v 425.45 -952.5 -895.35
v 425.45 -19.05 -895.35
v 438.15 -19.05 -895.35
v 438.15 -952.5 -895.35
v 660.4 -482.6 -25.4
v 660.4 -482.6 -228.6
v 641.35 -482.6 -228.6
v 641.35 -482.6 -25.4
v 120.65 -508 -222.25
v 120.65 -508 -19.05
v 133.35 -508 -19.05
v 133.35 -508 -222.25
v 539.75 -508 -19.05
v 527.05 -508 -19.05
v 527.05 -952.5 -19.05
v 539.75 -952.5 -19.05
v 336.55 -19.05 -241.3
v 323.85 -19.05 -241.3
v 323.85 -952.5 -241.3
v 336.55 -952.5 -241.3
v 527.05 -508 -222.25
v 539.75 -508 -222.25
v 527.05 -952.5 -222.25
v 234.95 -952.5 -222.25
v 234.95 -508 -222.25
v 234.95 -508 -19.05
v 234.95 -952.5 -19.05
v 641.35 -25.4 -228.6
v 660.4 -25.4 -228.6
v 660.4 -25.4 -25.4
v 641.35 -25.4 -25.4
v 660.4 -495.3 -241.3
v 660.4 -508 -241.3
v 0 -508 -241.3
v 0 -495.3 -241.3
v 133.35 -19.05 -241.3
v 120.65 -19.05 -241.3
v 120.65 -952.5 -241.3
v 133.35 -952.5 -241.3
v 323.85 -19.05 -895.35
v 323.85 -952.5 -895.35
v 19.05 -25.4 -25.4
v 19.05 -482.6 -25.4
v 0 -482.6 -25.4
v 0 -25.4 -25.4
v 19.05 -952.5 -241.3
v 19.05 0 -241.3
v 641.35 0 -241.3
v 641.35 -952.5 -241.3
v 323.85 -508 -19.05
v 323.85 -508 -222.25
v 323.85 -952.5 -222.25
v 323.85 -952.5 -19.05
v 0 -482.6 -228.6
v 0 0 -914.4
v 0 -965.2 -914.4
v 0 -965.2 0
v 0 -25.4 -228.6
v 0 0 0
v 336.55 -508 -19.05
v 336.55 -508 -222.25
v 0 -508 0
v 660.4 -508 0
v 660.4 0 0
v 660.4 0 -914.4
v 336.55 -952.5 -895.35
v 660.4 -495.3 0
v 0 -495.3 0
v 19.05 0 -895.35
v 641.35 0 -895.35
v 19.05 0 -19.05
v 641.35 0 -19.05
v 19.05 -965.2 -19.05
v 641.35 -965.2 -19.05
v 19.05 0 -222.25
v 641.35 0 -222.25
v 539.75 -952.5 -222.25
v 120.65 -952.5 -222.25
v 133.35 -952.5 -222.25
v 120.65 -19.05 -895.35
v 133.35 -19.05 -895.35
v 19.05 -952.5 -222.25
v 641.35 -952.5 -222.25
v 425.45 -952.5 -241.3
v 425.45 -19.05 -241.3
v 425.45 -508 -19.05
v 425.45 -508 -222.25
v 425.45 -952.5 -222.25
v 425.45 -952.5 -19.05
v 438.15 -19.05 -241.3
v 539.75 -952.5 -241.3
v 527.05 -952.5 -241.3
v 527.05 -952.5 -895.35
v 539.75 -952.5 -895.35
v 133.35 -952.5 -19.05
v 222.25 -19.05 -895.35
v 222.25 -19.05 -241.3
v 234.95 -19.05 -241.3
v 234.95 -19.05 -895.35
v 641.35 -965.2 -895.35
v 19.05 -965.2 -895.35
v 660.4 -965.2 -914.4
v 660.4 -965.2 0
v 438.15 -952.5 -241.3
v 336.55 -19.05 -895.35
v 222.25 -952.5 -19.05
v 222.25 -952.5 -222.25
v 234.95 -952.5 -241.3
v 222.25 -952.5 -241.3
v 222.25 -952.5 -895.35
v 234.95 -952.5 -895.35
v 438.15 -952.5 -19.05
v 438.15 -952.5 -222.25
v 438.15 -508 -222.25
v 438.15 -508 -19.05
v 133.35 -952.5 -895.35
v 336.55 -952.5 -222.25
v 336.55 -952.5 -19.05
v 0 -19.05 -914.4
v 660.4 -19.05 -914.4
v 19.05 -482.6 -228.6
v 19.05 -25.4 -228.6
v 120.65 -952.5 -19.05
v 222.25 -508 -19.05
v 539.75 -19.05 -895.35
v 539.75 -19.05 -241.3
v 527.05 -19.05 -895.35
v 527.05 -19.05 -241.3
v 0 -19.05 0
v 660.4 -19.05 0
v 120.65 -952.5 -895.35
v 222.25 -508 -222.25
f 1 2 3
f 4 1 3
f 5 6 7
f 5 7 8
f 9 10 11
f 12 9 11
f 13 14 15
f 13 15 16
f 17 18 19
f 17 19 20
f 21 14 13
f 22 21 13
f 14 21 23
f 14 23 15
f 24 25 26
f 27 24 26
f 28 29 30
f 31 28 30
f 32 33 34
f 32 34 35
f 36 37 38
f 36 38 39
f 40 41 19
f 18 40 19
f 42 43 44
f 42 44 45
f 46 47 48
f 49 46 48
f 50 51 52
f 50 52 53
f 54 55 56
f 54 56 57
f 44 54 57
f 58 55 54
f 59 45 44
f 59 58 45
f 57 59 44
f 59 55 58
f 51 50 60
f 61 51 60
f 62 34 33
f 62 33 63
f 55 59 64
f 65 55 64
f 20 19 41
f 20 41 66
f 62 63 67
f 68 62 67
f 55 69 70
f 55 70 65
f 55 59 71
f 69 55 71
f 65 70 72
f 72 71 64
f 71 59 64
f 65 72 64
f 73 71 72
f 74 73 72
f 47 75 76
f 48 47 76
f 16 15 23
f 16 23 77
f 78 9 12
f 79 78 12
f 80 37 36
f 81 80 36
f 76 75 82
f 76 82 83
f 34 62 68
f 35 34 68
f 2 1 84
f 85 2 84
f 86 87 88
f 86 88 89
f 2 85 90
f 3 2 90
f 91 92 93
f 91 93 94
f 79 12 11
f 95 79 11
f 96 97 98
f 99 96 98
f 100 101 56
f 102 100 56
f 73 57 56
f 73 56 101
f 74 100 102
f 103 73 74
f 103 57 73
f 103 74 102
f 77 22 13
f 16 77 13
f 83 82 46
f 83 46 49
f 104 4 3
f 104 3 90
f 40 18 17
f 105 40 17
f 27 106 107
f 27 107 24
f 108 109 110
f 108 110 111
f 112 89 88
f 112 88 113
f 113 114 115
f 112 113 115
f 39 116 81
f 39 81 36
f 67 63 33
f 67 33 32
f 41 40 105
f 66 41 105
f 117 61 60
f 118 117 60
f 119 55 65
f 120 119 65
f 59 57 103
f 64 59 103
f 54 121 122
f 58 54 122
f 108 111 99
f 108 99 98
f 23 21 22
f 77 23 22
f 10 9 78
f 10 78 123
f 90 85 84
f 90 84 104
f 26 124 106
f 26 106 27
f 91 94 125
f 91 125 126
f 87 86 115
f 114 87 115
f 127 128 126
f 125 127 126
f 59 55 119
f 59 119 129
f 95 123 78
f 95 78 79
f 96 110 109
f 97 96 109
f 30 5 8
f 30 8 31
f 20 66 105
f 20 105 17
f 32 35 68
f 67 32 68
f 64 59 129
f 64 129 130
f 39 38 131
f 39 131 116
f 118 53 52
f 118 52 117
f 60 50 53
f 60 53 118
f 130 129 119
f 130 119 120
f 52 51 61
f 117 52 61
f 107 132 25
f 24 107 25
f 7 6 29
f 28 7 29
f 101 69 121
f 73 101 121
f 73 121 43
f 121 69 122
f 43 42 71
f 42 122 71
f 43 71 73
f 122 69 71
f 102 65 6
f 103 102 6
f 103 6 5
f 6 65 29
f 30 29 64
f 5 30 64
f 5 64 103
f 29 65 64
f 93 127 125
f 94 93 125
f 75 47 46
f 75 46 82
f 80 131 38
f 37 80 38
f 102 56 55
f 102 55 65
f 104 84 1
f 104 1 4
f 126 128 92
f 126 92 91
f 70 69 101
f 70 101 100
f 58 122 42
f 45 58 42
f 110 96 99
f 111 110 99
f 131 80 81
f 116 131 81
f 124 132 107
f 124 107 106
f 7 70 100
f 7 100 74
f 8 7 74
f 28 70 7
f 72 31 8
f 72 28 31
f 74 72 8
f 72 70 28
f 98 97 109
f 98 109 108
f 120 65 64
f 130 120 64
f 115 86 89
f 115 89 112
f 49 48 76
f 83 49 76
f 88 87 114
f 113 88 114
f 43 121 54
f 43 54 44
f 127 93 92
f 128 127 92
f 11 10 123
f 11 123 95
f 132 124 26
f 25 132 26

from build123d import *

# Parameters (mm, degrees)
F0_W      = 660.4
F0_H      = 914.4
F0_W_2    = 622.3
F0_H_2    = 876.3
F1_DEPTH  = 965.2
F2_W      = 660.4
F2_H      = 914.4
F3_DEPTH  = 19.05
F4_W      = 457.2
F4_H      = 203.2
F5_DEPTH  = 726.44
F6_W      = 622.3
F6_H      = 19.05
F7_DEPTH  = 952.5
F8_W      = 12.7
F8_H      = 241.3
F9_DEPTH  = 660.4
F10_W     = 12.7
F10_H     = 203.2
F11_DEPTH = 444.5
F12_W     = 12.7
F12_H     = 654.05
F13_DEPTH = 933.45


with BuildPart() as f1:
    # F0 (on Front) → F1 (new body)
    with BuildSketch(Plane.XZ):
        with Locations((330.2, -457.2)):
            Rectangle(F0_W, F0_H)
        with Locations((330.2, -457.2)):
            Rectangle(F0_W_2, F0_H_2, mode=Mode.SUBTRACT)
    extrude(amount=F1_DEPTH)

    # F4 (on face) → F5 (cut)
    with BuildSketch(Plane.YZ.offset(660.4)):
        with Locations((-254, -127)):
            Rectangle(F4_W, F4_H)
    extrude(amount=-F5_DEPTH, mode=Mode.SUBTRACT)


with BuildPart() as f3:
    # F2 (on Front) → F3 (new body)
    with BuildSketch(Plane.XZ):
        with Locations((330.2, -457.2)):
            Rectangle(F2_W, F2_H)
    extrude(amount=F3_DEPTH)


with BuildPart() as f7:
    # F6 (on Front) → F7 (new body)
    with BuildSketch(Plane.XZ):
        with Locations((330.2, -231.775)):
            Rectangle(F6_W, F6_H)
    extrude(amount=F7_DEPTH)


with BuildPart() as f9:
    # F8 (on Right) → F9 (new body)
    with BuildSketch(Plane.YZ):
        with Locations((-501.65, -120.65)):
            Rectangle(F8_W, F8_H)
    extrude(amount=F9_DEPTH)


with BuildPart() as f11:
    # F10 (on face) → F11 (new body)
    with BuildSketch(Plane.XZ.offset(508)):
        with Locations((127, -120.65)):
            Rectangle(F10_W, F10_H)
        with Locations((228.6, -120.65)):
            Rectangle(F10_W, F10_H)
        with Locations((330.2, -120.65)):
            Rectangle(F10_W, F10_H)
        with Locations((431.8, -120.65)):
            Rectangle(F10_W, F10_H)
        with Locations((533.4, -120.65)):
            Rectangle(F10_W, F10_H)
    extrude(amount=F11_DEPTH)


with BuildPart() as f13:
    # F12 (on face) → F13 (new body)
    with BuildSketch(Plane.XZ.offset(19.05)):
        with Locations((228.6, -568.325)):
            Rectangle(F12_W, F12_H)
        with Locations((330.2, -568.325)):
            Rectangle(F12_W, F12_H)
        with Locations((431.8, -568.325)):
            Rectangle(F12_W, F12_H)
        with Locations((533.4, -568.325)):
            Rectangle(F12_W, F12_H)
        with Locations((127, -568.325)):
            Rectangle(F12_W, F12_H)
    extrude(amount=F13_DEPTH)


solid = Compound([f1.part, f3.part, f7.part, f9.part, f11.part, f13.part])
